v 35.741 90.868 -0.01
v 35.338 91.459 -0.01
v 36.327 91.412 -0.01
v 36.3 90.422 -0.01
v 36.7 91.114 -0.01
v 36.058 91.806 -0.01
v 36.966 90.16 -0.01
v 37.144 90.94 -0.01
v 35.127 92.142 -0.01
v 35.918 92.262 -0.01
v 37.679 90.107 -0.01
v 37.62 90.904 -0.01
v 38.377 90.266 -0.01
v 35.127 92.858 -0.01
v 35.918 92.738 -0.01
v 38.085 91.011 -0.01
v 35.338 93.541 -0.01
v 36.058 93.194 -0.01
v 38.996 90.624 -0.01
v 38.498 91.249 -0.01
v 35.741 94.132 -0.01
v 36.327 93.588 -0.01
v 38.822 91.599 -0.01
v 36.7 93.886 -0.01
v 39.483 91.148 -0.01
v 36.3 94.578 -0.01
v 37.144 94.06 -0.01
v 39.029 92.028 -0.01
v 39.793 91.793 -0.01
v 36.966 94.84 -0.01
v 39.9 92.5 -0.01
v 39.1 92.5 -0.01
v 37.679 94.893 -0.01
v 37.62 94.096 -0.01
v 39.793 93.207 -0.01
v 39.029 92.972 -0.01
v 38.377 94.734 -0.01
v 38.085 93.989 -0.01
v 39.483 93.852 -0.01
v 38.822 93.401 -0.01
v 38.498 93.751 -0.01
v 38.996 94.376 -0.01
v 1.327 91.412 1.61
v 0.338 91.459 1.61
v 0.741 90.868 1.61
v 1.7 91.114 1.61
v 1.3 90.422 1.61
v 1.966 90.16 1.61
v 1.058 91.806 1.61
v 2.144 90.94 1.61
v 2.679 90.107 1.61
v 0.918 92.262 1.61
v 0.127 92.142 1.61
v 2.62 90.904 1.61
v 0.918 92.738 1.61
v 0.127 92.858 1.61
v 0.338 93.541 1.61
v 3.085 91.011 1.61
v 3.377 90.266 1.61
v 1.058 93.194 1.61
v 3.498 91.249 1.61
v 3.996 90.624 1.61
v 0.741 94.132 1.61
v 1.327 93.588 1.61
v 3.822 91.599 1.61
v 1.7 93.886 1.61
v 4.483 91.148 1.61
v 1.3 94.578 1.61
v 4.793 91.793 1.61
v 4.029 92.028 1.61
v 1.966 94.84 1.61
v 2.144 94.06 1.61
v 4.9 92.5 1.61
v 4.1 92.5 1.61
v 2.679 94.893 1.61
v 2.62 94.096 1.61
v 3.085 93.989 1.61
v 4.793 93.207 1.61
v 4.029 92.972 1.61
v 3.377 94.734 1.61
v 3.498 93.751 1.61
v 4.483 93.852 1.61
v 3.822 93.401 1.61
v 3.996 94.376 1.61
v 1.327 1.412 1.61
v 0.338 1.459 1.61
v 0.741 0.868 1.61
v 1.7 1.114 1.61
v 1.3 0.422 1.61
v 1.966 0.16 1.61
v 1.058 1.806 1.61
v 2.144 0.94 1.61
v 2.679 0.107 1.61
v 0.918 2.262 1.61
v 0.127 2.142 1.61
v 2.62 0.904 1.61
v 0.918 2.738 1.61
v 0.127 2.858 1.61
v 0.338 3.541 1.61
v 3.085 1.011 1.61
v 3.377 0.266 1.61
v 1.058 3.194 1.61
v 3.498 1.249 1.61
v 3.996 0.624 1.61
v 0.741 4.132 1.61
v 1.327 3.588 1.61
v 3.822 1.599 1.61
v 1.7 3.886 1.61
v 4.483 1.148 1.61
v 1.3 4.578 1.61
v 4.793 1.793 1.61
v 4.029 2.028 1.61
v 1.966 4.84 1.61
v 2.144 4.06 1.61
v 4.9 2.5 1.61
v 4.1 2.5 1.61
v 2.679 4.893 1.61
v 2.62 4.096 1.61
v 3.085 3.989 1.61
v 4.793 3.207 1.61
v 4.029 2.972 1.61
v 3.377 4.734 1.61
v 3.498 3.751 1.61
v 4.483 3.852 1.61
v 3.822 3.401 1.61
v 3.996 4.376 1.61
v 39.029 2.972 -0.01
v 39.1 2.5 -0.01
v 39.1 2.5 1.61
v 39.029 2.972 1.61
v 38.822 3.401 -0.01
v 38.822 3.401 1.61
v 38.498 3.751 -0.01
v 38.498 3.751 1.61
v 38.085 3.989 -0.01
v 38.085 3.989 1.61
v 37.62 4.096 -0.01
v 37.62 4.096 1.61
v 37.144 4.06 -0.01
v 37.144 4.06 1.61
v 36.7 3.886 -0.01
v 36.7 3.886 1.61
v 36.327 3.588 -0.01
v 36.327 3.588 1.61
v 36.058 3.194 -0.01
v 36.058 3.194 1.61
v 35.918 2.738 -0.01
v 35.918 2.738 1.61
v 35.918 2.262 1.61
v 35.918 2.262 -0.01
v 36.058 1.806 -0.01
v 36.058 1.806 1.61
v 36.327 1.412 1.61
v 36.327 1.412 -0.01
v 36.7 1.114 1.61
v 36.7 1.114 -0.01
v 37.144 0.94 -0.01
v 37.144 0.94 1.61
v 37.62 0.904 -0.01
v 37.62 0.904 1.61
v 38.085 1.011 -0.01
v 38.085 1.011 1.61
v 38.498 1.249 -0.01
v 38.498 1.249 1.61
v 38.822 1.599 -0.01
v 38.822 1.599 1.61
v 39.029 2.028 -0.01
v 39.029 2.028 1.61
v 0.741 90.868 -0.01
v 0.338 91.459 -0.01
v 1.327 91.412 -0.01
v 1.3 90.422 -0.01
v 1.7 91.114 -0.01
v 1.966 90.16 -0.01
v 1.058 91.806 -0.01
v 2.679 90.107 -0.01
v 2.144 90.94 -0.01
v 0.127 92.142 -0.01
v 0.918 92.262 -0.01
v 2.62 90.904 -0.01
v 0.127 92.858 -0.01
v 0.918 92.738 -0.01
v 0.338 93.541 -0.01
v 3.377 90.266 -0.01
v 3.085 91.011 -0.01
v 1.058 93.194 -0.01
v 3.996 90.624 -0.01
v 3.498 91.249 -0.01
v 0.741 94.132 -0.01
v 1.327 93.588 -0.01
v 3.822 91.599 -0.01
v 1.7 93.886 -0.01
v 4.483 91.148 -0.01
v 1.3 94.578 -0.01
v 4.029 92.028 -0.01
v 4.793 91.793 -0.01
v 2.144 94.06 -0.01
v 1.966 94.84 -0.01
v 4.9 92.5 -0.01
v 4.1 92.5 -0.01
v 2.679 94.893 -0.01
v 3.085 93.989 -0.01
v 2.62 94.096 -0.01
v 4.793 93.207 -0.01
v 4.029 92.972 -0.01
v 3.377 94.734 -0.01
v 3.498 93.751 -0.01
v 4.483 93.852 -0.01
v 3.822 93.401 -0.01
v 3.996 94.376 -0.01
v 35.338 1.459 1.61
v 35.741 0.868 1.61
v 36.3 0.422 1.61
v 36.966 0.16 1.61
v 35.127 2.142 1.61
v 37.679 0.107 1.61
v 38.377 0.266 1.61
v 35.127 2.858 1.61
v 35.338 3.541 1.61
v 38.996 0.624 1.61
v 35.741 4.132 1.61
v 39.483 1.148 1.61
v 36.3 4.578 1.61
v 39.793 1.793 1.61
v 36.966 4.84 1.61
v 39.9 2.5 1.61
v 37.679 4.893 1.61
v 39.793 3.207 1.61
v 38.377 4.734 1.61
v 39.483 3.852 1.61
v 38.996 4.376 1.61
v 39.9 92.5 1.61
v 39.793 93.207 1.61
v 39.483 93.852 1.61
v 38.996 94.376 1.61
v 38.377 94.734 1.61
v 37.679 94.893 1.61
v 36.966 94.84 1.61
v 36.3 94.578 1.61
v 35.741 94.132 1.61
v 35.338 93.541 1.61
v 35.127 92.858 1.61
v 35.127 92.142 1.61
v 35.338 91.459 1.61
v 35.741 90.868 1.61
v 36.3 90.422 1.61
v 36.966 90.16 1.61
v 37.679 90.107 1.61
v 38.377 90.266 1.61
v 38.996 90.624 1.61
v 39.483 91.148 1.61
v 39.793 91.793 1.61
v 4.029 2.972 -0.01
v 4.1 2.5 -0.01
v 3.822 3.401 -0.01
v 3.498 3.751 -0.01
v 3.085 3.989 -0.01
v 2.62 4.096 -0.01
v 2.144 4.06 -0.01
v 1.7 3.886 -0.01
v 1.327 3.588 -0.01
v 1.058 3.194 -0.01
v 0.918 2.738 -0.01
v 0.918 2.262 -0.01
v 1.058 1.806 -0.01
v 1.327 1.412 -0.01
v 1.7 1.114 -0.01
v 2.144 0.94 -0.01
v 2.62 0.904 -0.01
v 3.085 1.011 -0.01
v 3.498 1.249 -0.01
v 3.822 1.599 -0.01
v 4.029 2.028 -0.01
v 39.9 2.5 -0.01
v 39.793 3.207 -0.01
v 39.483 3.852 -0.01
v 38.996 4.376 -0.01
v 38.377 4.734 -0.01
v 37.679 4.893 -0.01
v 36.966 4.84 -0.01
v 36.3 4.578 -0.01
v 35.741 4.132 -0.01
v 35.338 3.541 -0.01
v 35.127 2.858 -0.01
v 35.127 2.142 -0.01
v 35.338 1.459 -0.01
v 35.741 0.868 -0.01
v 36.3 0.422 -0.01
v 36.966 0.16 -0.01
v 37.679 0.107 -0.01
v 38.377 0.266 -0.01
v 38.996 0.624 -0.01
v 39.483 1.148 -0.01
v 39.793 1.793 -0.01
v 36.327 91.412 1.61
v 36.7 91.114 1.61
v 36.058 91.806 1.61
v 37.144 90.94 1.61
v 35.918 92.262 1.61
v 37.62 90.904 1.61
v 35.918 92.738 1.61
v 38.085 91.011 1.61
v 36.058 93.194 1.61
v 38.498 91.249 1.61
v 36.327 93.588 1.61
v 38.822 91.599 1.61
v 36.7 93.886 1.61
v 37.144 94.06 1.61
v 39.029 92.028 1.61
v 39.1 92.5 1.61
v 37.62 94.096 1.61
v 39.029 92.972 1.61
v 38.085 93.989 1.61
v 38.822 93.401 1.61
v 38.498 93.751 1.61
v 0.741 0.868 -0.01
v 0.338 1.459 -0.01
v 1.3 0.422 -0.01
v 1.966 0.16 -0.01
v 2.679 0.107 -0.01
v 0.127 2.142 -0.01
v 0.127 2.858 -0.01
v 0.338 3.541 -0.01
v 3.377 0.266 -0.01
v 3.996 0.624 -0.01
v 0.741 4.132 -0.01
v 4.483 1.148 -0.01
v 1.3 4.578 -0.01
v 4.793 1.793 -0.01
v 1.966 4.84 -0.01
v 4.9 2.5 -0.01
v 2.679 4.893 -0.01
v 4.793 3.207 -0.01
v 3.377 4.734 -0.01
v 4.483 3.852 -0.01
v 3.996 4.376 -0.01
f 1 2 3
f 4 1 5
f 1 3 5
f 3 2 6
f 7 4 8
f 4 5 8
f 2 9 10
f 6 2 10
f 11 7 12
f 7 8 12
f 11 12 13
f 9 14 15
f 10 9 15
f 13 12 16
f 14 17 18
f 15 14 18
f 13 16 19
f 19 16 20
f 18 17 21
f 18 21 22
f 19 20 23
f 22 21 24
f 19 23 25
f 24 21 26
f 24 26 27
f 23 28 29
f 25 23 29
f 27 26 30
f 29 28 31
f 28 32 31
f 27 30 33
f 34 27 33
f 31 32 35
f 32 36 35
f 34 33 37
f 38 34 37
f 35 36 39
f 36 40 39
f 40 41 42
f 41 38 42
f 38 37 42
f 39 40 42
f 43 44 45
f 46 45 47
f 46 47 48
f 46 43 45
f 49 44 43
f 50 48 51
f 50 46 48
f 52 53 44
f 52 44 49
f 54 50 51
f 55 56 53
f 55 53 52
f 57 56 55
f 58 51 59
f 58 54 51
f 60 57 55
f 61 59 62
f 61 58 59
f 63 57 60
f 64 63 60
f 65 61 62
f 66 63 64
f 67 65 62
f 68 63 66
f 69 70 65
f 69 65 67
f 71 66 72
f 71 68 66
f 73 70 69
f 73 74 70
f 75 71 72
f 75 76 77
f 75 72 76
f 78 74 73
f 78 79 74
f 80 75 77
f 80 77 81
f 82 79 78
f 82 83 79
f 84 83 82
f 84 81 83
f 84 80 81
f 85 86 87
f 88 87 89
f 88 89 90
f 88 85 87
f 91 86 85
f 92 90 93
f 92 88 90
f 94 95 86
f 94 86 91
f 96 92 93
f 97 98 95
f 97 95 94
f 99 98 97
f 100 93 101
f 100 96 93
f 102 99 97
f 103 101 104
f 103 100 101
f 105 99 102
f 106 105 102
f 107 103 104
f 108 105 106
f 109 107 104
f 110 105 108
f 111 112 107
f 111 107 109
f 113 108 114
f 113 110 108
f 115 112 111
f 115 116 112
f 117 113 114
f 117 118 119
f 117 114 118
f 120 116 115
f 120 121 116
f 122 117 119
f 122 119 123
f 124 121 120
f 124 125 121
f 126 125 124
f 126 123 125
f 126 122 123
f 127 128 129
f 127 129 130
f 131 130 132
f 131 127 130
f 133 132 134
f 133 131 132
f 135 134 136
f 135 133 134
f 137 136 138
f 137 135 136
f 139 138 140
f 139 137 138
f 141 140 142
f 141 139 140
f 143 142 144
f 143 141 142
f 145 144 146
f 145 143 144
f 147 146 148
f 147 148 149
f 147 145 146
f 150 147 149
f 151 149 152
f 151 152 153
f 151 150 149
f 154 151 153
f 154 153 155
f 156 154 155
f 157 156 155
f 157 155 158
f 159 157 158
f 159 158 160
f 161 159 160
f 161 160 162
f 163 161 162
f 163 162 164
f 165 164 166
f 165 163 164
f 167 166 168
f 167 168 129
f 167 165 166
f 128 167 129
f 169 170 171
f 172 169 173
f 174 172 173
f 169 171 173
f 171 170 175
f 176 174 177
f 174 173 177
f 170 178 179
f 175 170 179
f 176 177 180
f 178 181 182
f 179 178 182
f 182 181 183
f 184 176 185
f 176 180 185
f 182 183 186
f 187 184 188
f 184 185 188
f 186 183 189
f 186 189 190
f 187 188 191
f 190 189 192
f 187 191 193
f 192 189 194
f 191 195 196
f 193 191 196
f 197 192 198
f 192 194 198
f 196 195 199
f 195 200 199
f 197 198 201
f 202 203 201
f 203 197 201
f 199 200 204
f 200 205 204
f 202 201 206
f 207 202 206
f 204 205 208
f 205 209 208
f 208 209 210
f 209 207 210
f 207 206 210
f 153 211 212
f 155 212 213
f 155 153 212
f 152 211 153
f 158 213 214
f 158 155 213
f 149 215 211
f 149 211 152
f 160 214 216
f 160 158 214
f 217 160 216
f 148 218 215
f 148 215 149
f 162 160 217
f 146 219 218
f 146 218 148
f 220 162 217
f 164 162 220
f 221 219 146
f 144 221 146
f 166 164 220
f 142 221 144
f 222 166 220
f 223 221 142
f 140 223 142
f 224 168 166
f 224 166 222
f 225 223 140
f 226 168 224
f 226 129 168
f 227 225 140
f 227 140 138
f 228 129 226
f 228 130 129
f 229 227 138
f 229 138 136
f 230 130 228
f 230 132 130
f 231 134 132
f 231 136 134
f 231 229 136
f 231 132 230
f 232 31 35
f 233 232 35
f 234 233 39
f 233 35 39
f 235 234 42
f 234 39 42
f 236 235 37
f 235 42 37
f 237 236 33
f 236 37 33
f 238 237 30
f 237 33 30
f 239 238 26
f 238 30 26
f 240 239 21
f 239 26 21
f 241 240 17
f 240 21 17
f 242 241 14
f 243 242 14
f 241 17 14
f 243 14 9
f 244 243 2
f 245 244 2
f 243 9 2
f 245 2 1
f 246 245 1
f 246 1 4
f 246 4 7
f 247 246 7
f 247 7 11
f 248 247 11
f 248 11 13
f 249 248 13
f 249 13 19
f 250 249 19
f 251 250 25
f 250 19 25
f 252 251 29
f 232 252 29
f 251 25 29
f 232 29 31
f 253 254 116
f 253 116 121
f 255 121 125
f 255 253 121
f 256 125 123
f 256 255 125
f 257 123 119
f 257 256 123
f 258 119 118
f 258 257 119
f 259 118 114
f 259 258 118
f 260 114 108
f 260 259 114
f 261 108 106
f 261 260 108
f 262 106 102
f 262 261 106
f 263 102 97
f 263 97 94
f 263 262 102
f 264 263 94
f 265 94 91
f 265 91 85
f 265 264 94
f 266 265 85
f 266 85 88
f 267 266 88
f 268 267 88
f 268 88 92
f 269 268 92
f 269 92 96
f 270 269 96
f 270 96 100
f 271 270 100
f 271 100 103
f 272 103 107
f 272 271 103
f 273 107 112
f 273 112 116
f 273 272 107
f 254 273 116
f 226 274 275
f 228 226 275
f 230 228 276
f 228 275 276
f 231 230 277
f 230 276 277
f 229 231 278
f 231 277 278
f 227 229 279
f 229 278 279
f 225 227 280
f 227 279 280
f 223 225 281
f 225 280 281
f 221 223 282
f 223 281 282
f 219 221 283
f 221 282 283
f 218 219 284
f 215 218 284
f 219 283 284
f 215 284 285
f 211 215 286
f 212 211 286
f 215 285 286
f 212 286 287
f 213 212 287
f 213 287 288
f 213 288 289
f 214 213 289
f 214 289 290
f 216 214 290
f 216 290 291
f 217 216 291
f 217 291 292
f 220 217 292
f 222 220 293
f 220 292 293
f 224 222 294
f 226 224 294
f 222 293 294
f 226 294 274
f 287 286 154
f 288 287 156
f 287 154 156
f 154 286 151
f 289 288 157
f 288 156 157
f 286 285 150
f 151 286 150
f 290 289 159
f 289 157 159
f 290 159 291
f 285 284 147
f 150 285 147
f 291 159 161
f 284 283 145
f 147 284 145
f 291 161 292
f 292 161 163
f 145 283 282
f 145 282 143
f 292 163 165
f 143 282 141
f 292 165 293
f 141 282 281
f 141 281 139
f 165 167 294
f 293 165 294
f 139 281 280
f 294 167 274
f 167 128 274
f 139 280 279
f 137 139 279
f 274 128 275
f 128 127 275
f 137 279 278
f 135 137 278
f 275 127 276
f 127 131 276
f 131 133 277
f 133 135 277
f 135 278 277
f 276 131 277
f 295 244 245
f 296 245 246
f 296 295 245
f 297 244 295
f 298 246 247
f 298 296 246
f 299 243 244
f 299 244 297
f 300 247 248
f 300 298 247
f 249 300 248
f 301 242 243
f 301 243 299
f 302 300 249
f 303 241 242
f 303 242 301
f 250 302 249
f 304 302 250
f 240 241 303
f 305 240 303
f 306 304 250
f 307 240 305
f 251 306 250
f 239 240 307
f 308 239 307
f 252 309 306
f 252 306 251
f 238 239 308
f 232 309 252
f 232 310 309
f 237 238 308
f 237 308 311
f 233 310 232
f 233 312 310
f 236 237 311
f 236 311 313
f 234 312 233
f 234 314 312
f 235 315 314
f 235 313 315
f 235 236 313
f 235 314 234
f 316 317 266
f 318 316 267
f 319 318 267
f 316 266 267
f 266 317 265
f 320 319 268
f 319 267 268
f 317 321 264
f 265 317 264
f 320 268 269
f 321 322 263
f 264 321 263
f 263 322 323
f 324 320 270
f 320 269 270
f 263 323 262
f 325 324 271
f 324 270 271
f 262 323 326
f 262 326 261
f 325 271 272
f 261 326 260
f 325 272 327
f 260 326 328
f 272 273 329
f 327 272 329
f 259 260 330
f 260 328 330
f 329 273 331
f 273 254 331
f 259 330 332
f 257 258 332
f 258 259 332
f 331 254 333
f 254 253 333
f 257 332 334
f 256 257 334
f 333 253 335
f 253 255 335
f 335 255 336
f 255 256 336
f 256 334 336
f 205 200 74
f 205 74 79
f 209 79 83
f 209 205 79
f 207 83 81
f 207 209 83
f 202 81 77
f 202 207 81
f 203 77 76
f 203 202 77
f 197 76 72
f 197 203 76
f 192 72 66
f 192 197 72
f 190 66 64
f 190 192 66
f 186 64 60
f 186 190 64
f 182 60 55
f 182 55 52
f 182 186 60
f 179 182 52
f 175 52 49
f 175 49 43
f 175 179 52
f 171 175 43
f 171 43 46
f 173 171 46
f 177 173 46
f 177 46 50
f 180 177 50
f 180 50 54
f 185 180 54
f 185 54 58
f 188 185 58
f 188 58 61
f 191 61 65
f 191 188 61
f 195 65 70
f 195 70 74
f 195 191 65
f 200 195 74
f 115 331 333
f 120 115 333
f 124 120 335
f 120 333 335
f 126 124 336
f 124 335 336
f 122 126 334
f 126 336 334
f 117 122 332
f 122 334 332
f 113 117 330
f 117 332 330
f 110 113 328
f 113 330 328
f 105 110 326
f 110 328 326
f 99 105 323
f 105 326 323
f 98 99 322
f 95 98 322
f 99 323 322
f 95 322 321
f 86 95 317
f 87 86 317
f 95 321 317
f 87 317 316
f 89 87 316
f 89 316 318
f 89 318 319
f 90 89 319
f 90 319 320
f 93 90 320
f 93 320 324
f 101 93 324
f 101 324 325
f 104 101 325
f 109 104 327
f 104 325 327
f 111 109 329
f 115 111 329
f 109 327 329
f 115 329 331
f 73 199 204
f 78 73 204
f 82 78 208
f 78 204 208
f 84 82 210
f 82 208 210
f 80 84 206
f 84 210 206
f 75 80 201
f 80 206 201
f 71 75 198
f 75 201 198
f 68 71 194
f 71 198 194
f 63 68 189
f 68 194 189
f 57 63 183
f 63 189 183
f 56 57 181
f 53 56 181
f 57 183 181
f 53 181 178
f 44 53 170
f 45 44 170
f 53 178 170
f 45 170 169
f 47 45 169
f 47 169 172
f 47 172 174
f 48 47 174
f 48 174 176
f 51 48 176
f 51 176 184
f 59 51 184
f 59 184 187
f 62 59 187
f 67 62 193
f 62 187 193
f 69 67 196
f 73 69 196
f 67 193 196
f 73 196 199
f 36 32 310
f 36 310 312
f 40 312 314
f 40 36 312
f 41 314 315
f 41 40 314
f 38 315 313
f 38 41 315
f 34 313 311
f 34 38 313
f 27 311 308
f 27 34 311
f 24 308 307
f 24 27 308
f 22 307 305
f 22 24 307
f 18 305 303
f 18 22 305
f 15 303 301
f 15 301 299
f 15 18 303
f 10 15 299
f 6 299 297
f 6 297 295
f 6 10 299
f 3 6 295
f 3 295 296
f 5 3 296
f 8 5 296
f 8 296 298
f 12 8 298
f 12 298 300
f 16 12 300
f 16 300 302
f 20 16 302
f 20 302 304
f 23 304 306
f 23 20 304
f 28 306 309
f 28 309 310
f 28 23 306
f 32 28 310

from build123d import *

# Parameters (mm, degrees)
SKETCH001002047_W = 41
SKETCH001002047_H = 96
SKETCH001002047_R = 2.4
PAD034_DEPTH      = 1.62
SKETCH001002045_W = 41
SKETCH001002045_H = 96
SKETCH001002045_R = 1.6
PAD032_DEPTH      = 1.62


with BuildPart() as body027:
    # Sketch001002047 → Pad034 (new body)
    with BuildSketch(Plane.XY.offset(-0.01)):
        with Locations((20, 47.5)):
            Rectangle(SKETCH001002047_W, SKETCH001002047_H)
        with Locations((2.5, 2.5)):
            Circle(SKETCH001002047_R, mode=Mode.SUBTRACT)
        with Locations((37.5, 2.5)):
            Circle(SKETCH001002047_R, mode=Mode.SUBTRACT)
        with Locations((37.5, 92.5)):
            Circle(SKETCH001002047_R, mode=Mode.SUBTRACT)
        with Locations((2.5, 92.5)):
            Circle(SKETCH001002047_R, mode=Mode.SUBTRACT)
    extrude(amount=PAD034_DEPTH)


with BuildPart() as cut010:
    # Sketch001002045 → Pad032 (new body)
    with BuildSketch(Plane.XY.offset(-0.01)):
        with Locations((20, 47.5)):
            Rectangle(SKETCH001002045_W, SKETCH001002045_H)
        with Locations((2.5, 2.5)):
            Circle(SKETCH001002045_R, mode=Mode.SUBTRACT)
        with Locations((37.5, 2.5)):
            Circle(SKETCH001002045_R, mode=Mode.SUBTRACT)
        with Locations((37.5, 92.5)):
            Circle(SKETCH001002045_R, mode=Mode.SUBTRACT)
        with Locations((2.5, 92.5)):
            Circle(SKETCH001002045_R, mode=Mode.SUBTRACT)
    extrude(amount=PAD032_DEPTH)

    # Cut001: cut Body027
    add(body027.part, mode=Mode.SUBTRACT)


solid = cut010.part
